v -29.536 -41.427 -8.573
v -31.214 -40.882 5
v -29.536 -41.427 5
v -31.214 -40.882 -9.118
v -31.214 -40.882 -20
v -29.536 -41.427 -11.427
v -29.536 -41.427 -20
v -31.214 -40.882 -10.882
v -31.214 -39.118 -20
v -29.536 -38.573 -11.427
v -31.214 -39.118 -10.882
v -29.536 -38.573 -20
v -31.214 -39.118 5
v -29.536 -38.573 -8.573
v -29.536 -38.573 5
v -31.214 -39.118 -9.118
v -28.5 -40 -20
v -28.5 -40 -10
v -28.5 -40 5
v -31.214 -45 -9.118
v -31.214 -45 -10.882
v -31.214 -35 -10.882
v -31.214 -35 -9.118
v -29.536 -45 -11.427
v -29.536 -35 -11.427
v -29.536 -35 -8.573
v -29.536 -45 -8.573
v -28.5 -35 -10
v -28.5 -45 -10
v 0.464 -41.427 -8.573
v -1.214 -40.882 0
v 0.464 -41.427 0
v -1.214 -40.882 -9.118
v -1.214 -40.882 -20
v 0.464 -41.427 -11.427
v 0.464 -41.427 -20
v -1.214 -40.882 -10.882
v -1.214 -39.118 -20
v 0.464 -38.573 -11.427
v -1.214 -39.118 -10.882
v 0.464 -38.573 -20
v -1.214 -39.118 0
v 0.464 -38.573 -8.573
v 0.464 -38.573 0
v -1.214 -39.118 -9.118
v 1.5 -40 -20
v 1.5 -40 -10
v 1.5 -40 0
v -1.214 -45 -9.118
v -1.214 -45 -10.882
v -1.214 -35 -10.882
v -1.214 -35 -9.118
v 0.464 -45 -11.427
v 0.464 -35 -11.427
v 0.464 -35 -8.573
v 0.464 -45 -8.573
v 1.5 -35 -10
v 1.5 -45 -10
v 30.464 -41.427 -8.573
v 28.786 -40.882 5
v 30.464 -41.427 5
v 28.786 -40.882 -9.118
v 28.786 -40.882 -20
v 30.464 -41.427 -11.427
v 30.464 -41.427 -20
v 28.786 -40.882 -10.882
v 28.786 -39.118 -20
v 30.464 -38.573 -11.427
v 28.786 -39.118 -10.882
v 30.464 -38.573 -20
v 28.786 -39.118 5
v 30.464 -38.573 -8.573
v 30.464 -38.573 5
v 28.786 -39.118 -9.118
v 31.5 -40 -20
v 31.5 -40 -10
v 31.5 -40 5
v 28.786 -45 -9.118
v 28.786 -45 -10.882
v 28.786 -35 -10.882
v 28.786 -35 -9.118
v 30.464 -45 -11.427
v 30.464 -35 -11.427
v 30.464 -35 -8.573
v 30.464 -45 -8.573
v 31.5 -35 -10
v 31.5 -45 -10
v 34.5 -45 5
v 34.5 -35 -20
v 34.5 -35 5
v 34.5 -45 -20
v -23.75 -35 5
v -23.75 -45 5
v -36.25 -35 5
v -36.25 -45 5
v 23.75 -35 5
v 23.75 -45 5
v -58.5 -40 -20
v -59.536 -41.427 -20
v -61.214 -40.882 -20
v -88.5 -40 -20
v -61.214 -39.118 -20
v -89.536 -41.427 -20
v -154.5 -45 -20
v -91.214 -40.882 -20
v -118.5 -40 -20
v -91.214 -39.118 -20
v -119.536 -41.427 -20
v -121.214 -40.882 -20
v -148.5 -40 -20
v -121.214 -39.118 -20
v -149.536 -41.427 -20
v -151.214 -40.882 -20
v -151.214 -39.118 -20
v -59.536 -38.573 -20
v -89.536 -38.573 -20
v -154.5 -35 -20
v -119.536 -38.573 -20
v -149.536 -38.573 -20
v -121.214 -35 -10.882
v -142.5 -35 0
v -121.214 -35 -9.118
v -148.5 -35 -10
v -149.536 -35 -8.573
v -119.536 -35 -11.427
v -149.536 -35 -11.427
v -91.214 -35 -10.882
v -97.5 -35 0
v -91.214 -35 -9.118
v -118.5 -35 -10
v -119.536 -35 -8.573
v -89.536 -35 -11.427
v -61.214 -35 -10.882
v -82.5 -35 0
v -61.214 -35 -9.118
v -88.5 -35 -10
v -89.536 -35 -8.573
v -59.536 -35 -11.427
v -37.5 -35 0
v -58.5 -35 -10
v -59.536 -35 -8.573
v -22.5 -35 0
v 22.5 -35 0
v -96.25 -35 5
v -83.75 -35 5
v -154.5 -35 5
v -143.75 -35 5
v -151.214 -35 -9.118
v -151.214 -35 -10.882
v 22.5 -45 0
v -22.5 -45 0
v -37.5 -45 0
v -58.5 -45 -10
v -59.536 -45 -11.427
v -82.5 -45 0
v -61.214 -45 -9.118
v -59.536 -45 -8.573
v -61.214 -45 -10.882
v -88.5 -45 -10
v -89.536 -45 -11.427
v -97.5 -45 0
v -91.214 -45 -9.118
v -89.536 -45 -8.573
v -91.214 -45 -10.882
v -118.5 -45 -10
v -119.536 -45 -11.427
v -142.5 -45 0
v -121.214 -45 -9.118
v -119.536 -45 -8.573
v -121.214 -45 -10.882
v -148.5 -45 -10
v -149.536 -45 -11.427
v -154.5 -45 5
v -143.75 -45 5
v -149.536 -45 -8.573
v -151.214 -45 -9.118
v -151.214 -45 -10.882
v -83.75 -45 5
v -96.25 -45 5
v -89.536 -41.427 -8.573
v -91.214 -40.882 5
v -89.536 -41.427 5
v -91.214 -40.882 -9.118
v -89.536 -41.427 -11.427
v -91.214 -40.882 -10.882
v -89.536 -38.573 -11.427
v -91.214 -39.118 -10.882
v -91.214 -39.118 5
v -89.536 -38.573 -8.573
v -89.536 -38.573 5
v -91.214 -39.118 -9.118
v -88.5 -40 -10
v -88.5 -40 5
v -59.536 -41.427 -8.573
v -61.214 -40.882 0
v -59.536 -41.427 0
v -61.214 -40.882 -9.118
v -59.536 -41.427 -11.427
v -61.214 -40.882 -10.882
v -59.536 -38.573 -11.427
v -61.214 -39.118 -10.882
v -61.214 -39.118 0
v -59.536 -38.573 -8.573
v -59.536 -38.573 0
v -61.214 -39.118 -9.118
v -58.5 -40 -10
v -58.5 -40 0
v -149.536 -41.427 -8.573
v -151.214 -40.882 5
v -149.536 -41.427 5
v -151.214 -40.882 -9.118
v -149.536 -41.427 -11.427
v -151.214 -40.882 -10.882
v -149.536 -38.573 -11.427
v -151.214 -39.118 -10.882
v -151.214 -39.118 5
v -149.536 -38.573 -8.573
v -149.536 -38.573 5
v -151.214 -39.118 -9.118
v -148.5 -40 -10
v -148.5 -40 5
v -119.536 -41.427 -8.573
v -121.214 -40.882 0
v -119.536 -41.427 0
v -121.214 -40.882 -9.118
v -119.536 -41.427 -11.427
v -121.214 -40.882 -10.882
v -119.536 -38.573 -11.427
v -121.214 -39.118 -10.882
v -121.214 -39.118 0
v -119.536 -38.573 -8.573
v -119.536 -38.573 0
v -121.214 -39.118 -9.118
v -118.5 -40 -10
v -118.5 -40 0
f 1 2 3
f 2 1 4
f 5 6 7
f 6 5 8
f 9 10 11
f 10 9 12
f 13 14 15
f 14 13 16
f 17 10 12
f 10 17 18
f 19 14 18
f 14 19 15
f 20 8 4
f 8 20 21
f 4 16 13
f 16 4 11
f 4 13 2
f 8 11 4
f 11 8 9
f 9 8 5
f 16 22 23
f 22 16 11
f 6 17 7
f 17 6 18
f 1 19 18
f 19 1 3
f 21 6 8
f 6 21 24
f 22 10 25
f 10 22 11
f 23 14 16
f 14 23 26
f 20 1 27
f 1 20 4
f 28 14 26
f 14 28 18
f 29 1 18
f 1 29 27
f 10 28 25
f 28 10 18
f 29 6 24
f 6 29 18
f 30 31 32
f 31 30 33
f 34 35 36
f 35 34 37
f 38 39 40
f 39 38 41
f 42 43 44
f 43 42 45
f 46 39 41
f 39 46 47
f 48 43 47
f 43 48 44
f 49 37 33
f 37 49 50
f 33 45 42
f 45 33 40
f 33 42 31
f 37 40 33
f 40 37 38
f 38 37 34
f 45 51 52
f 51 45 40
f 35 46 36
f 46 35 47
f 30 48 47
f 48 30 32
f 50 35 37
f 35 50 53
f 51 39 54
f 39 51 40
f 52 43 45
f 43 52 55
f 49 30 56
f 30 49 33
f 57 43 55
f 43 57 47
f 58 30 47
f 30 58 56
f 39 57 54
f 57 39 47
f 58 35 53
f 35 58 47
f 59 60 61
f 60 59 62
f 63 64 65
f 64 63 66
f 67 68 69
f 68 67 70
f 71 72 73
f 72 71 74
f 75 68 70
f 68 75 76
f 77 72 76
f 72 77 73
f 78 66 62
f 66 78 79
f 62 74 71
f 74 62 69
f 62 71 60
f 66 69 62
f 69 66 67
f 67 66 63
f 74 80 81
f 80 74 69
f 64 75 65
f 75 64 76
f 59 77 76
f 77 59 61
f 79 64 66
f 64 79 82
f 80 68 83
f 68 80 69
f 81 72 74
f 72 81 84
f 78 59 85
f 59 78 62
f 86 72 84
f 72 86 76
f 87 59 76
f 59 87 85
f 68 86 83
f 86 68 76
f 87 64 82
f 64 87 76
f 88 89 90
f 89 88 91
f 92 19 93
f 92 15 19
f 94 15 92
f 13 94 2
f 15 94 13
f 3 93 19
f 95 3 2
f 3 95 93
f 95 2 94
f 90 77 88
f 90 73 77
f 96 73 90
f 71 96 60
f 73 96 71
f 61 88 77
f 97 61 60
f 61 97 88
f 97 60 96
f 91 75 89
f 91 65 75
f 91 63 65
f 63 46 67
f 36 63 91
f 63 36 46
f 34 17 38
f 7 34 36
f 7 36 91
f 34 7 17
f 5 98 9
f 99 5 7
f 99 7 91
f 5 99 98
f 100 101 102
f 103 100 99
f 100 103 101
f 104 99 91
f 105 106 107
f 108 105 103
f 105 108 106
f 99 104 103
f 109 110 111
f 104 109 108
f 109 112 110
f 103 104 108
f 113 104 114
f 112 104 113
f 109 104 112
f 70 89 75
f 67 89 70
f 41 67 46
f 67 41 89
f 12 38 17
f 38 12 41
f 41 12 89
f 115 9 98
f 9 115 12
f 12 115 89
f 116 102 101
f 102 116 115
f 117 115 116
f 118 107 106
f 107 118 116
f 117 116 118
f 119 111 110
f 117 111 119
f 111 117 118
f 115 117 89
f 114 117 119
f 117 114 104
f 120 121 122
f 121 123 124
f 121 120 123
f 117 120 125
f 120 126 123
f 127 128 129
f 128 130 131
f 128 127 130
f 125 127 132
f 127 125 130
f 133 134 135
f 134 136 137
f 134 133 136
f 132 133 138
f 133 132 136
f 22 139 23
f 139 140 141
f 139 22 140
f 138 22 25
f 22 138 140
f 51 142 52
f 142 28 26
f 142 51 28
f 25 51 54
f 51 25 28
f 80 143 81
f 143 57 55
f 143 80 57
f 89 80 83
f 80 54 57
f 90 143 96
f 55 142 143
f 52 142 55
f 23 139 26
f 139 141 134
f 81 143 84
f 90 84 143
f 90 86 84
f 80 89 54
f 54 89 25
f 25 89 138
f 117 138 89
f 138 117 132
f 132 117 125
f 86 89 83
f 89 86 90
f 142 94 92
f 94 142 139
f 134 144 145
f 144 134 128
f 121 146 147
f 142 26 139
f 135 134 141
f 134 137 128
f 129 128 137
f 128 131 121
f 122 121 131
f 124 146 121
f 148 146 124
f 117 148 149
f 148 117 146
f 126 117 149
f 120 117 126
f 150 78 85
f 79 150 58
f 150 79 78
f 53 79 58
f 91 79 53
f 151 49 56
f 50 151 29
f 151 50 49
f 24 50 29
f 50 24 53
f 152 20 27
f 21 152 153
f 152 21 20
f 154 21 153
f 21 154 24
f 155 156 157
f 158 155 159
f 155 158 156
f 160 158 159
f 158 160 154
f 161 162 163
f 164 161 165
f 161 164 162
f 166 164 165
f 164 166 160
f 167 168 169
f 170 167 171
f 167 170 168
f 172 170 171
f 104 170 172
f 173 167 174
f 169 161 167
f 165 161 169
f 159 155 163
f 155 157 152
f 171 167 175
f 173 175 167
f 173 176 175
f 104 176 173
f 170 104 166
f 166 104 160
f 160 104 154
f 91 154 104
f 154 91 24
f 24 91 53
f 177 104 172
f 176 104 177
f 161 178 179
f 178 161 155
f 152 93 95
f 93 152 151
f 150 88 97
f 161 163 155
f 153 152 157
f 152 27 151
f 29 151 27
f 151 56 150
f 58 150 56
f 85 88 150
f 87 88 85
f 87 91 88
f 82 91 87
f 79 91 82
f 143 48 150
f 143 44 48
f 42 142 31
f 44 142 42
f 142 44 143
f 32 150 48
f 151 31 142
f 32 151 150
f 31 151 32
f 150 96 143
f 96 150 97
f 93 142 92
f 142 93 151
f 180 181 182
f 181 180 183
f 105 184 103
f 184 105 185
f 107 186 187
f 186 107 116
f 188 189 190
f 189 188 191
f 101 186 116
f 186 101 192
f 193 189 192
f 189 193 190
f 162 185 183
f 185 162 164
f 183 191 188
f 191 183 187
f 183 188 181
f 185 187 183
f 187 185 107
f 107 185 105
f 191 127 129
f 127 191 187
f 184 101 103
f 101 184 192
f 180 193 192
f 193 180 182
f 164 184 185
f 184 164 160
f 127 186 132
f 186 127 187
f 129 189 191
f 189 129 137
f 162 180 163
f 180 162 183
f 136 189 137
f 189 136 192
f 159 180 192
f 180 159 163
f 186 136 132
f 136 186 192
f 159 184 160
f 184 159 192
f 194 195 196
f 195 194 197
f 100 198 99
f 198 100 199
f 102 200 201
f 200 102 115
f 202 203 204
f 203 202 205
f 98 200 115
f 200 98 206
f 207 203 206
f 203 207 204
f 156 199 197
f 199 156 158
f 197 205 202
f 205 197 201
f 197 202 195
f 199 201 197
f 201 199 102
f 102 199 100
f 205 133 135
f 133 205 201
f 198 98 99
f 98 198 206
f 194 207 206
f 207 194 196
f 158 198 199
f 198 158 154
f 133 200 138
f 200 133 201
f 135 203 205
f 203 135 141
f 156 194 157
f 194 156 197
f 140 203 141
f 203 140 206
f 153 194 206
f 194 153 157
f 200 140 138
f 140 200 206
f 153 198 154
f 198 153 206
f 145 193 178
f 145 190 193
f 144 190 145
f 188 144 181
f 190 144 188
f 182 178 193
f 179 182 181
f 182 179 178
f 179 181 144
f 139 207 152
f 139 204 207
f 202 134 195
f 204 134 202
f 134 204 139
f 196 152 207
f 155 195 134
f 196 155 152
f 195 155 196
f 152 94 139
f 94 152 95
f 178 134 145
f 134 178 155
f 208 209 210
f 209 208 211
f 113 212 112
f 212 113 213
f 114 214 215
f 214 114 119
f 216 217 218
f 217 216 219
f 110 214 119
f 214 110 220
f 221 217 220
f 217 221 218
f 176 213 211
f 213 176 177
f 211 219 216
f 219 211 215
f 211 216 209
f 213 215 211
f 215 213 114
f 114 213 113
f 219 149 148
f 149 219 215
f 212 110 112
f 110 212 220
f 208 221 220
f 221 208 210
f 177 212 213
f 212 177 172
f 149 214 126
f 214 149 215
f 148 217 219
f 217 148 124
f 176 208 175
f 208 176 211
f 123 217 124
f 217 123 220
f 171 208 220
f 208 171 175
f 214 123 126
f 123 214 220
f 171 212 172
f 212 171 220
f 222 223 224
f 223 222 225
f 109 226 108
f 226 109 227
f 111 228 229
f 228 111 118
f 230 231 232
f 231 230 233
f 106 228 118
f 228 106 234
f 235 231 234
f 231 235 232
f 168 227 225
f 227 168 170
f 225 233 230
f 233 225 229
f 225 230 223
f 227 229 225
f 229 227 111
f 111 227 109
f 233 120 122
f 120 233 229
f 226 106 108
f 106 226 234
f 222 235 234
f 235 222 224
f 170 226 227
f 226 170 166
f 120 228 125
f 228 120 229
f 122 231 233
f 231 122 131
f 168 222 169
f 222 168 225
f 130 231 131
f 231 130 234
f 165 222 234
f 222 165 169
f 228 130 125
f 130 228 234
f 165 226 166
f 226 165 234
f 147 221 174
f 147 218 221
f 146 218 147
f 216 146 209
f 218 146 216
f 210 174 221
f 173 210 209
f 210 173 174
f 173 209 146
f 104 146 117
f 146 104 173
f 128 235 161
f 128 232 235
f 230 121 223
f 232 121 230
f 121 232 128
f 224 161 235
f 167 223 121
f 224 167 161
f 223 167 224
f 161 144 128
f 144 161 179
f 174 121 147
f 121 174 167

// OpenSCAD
// file: tote.scad
include <config.scad>;

module tote() {
  hull() {
    translate([0, 0, toteHeight/2])
      cube([toteBottomWidth, toteBottomLength, toteHeight], center = true);
    translate([0, 0, toteHeight -e/2])
      cube([toteTopWidth, toteTopLength, e], center = true);
  }
}

module totes() {
  for (x = [0:(totesPerRow-1)])
    translate([-x*toteTopWidth, 0, 0])
      scale(0.99)
        tote();
}

tote();
// file: config.scad
e = 0.01;

// Real Sterilite Tote Size
//toteHeight = 125;
//toteTopWidth = 200;
//toteBottomWidth = 155;
//toteTopLength = 355;
//toteBottomLength = 300;

// Scaled Size
toteHeight = 30;
toteTopWidth = 60;
toteBottomWidth = 45;
toteTopLength = 105;
toteBottomLength = 90;

// Parameters
fingerHeight = 5;
fingerClearance = 5;

armatureHeight = 10;
armatureThickness = 20;

baseHeight = 20;
baseThickness = 10;

boltDiameter = 3;
pinDiameter = 4;

base2Height = 20;

totesPerRow = 3;
// main file
include <config.scad>;
use <tote.scad>;

module rest_piece() {
  difference() {
    translate([0, 0, (fingerHeight + baseHeight)/2 - baseHeight])
      cube([toteTopWidth + boltDiameter*3, baseThickness, fingerHeight + baseHeight], center = true);
    tote();
    for (x = [-1, 0, 1])
      translate([x*toteTopWidth/2, 0, -baseHeight/2]) {
        cylinder(d = boltDiameter, h = baseHeight + fingerHeight*2 + 1, center = true);
        rotate([90, 0, 0])
          cylinder(d = boltDiameter, h = baseThickness + 1, center = true);
      }
  }
}

module rest() {
  for (x = [0:(totesPerRow-1)])
    translate([-x*toteTopWidth, baseThickness/2 - toteBottomWidth, 0])
      rest_piece();
}

rest();
